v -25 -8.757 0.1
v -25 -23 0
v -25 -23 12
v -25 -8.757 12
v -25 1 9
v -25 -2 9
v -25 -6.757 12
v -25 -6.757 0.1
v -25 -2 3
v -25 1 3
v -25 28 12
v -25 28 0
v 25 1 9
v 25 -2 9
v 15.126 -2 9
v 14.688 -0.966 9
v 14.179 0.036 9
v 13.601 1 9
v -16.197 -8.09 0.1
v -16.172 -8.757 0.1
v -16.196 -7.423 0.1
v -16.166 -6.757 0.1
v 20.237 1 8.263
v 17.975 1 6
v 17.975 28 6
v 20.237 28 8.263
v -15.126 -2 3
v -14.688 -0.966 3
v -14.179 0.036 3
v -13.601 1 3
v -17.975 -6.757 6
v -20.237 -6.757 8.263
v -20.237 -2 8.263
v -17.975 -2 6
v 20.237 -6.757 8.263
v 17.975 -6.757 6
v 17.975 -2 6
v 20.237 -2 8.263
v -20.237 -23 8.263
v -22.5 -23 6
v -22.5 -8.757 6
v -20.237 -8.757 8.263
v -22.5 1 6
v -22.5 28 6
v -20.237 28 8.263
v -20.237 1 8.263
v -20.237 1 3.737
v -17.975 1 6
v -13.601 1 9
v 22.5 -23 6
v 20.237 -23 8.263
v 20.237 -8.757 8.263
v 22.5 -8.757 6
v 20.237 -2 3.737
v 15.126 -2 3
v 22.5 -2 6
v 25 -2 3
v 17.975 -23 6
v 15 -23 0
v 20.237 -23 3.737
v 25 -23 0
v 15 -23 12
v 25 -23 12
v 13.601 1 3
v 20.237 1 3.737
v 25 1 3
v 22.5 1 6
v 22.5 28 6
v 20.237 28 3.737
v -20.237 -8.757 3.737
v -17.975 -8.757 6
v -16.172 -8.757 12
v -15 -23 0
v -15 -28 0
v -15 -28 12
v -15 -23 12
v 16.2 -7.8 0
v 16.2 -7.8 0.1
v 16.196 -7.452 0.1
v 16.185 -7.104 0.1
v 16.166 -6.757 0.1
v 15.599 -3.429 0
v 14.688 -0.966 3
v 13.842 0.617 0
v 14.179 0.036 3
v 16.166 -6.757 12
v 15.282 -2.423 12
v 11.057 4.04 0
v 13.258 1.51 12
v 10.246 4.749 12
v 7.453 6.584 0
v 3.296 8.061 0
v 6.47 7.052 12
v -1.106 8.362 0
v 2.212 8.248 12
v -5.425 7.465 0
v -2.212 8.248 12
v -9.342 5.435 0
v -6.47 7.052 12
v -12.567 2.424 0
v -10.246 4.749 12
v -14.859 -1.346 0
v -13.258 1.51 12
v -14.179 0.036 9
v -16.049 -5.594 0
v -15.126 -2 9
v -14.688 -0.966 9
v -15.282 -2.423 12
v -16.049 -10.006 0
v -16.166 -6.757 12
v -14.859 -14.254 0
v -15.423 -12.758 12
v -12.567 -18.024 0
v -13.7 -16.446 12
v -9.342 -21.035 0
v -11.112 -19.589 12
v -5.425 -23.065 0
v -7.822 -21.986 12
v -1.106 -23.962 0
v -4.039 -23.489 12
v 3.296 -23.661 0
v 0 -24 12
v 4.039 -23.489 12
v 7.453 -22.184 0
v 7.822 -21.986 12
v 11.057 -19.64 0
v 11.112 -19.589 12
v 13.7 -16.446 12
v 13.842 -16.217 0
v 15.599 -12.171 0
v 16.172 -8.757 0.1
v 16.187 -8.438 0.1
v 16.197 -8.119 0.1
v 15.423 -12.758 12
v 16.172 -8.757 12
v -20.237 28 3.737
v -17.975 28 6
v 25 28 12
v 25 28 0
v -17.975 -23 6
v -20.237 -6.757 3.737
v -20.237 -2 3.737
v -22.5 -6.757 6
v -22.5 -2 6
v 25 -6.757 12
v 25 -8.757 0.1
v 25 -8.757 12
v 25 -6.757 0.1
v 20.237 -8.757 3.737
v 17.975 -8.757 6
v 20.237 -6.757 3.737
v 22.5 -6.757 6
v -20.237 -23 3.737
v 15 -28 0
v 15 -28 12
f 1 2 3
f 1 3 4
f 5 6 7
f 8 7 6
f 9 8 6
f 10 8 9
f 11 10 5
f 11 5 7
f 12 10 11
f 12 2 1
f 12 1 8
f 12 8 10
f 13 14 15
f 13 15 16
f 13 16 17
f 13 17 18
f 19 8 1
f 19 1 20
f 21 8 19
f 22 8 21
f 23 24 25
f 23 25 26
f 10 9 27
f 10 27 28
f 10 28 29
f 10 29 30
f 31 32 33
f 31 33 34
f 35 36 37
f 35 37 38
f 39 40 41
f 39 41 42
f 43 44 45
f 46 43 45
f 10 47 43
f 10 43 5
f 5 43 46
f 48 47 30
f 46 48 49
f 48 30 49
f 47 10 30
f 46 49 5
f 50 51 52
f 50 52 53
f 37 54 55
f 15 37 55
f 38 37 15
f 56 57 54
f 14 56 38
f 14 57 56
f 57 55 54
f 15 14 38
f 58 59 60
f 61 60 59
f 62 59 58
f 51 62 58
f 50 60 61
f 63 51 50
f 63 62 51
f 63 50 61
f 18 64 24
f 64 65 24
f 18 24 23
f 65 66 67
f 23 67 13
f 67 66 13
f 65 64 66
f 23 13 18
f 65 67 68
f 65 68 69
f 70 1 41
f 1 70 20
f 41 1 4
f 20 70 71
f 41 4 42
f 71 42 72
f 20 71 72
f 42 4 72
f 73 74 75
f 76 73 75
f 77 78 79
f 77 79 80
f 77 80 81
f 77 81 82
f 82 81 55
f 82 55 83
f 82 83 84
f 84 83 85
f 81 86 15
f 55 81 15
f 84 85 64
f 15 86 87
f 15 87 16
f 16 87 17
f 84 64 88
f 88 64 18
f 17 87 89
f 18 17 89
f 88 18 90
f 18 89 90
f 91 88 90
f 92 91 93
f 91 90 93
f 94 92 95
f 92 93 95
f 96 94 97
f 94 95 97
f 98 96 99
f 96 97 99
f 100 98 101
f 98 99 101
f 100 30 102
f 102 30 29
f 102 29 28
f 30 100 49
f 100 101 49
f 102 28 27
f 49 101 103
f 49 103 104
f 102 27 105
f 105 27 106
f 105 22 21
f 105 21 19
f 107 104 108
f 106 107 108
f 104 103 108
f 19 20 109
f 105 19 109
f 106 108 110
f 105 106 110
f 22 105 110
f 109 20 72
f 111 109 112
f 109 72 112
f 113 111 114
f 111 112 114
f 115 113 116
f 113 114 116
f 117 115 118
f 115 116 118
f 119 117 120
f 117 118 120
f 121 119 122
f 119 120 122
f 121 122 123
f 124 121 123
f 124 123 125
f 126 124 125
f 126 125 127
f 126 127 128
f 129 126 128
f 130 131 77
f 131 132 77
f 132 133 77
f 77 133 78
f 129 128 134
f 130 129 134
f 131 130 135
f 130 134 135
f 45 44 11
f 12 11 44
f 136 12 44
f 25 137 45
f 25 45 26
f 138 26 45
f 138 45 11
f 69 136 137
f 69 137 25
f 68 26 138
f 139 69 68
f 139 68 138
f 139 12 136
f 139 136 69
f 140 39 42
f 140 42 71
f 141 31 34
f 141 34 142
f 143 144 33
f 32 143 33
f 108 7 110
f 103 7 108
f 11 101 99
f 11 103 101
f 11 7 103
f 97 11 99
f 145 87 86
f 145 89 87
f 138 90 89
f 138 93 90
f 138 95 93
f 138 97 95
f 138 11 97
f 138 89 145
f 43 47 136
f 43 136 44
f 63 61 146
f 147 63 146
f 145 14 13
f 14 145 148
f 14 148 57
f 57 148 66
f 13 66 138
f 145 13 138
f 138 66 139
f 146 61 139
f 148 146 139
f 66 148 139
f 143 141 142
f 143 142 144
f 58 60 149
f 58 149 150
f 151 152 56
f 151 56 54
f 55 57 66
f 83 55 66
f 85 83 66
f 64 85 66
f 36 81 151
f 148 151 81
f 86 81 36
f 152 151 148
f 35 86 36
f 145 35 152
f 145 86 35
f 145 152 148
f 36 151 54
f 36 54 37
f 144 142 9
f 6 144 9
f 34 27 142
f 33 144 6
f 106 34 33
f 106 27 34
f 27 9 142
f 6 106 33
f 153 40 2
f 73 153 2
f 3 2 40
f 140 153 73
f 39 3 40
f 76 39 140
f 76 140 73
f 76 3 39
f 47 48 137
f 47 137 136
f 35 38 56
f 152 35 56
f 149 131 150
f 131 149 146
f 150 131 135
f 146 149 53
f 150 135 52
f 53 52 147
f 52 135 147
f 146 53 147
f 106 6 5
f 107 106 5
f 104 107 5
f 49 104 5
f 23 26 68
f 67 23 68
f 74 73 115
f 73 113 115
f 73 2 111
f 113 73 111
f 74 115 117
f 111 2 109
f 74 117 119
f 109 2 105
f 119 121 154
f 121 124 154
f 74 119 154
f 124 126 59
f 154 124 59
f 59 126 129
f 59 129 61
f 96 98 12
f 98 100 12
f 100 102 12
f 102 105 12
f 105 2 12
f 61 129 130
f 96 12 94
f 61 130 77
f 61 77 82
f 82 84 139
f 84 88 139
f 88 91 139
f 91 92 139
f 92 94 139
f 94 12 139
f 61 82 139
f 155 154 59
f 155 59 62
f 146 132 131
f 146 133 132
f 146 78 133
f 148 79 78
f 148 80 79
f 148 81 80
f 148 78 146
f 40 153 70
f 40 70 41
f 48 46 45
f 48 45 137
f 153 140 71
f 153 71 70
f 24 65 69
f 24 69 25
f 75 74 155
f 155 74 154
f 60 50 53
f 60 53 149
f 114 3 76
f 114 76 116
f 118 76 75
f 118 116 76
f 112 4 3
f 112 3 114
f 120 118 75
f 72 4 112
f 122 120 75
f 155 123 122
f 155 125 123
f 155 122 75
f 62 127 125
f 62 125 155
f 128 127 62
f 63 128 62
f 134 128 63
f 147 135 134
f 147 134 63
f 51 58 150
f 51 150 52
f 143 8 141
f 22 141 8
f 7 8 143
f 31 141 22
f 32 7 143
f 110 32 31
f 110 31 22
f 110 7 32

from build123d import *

# Parameters (mm, degrees)
SKETCH_W        = 50
SKETCH_H        = 56
PAD_DEPTH       = 12
SKETCH001_R     = 16.2
POCKET_DEPTH    = 12.001
POCKET001_DEPTH = 56.001
SKETCH003_W     = 3
SKETCH003_H     = 6
POCKET002_DEPTH = 50.001
SKETCH004_W     = 72.31723
SKETCH004_H     = 2
POCKET003_DEPTH = 11.9
SKETCH005_W     = 25.040878
SKETCH005_H     = 17.68627
SKETCH005_W_2   = 12.208063
SKETCH005_H_2   = 50.590956
POCKET004_DEPTH = 5


with BuildPart() as part:
    # Sketch → Pad (new body)
    with BuildSketch(Plane.XY):
        Rectangle(SKETCH_W, SKETCH_H)
    extrude(amount=PAD_DEPTH)

    # Sketch001 → Pocket (cut, through all)
    with BuildSketch(Plane.XY.offset(12)):
        with Locations((0, -7.8)):
            Circle(SKETCH001_R)
    extrude(amount=-POCKET_DEPTH, mode=Mode.SUBTRACT)

    # Sketch002 → Pocket001 (cut, through all)
    with BuildSketch(Plane.XZ.offset(28)):
        Polygon((-22.5, 6), (-20.237258, 8.262742), (-17.974517, 6), (-20.237258, 3.737258), align=None)
        Polygon((17.974517, 6), (20.237258, 8.262742), (22.5, 6), (20.237258, 3.737258), align=None)
    extrude(amount=-POCKET001_DEPTH, mode=Mode.SUBTRACT)

    # Sketch003 → Pocket002 (cut, through all)
    with BuildSketch(Plane.YZ.offset(25)):
        with Locations((-0.5, 6)):
            Rectangle(SKETCH003_W, SKETCH003_H)
    extrude(amount=-POCKET002_DEPTH, mode=Mode.SUBTRACT)

    # Sketch004 → Pocket003 (cut)
    with BuildSketch(Plane.XY.offset(12)):
        with Locations((1.135831, -7.756839)):
            Rectangle(SKETCH004_W, SKETCH004_H)
    extrude(amount=-POCKET003_DEPTH, mode=Mode.SUBTRACT)

    # Sketch005 → Pocket004 (cut)
    with BuildSketch(Plane.XZ.offset(28)):
        with Locations((-27.520439, 4.662494)):
            Rectangle(SKETCH005_W, SKETCH005_H)
        with Locations((21.104031, -3.872155)):
            Rectangle(SKETCH005_W_2, SKETCH005_H_2)
    extrude(amount=-POCKET004_DEPTH, mode=Mode.SUBTRACT)


solid = part.part
